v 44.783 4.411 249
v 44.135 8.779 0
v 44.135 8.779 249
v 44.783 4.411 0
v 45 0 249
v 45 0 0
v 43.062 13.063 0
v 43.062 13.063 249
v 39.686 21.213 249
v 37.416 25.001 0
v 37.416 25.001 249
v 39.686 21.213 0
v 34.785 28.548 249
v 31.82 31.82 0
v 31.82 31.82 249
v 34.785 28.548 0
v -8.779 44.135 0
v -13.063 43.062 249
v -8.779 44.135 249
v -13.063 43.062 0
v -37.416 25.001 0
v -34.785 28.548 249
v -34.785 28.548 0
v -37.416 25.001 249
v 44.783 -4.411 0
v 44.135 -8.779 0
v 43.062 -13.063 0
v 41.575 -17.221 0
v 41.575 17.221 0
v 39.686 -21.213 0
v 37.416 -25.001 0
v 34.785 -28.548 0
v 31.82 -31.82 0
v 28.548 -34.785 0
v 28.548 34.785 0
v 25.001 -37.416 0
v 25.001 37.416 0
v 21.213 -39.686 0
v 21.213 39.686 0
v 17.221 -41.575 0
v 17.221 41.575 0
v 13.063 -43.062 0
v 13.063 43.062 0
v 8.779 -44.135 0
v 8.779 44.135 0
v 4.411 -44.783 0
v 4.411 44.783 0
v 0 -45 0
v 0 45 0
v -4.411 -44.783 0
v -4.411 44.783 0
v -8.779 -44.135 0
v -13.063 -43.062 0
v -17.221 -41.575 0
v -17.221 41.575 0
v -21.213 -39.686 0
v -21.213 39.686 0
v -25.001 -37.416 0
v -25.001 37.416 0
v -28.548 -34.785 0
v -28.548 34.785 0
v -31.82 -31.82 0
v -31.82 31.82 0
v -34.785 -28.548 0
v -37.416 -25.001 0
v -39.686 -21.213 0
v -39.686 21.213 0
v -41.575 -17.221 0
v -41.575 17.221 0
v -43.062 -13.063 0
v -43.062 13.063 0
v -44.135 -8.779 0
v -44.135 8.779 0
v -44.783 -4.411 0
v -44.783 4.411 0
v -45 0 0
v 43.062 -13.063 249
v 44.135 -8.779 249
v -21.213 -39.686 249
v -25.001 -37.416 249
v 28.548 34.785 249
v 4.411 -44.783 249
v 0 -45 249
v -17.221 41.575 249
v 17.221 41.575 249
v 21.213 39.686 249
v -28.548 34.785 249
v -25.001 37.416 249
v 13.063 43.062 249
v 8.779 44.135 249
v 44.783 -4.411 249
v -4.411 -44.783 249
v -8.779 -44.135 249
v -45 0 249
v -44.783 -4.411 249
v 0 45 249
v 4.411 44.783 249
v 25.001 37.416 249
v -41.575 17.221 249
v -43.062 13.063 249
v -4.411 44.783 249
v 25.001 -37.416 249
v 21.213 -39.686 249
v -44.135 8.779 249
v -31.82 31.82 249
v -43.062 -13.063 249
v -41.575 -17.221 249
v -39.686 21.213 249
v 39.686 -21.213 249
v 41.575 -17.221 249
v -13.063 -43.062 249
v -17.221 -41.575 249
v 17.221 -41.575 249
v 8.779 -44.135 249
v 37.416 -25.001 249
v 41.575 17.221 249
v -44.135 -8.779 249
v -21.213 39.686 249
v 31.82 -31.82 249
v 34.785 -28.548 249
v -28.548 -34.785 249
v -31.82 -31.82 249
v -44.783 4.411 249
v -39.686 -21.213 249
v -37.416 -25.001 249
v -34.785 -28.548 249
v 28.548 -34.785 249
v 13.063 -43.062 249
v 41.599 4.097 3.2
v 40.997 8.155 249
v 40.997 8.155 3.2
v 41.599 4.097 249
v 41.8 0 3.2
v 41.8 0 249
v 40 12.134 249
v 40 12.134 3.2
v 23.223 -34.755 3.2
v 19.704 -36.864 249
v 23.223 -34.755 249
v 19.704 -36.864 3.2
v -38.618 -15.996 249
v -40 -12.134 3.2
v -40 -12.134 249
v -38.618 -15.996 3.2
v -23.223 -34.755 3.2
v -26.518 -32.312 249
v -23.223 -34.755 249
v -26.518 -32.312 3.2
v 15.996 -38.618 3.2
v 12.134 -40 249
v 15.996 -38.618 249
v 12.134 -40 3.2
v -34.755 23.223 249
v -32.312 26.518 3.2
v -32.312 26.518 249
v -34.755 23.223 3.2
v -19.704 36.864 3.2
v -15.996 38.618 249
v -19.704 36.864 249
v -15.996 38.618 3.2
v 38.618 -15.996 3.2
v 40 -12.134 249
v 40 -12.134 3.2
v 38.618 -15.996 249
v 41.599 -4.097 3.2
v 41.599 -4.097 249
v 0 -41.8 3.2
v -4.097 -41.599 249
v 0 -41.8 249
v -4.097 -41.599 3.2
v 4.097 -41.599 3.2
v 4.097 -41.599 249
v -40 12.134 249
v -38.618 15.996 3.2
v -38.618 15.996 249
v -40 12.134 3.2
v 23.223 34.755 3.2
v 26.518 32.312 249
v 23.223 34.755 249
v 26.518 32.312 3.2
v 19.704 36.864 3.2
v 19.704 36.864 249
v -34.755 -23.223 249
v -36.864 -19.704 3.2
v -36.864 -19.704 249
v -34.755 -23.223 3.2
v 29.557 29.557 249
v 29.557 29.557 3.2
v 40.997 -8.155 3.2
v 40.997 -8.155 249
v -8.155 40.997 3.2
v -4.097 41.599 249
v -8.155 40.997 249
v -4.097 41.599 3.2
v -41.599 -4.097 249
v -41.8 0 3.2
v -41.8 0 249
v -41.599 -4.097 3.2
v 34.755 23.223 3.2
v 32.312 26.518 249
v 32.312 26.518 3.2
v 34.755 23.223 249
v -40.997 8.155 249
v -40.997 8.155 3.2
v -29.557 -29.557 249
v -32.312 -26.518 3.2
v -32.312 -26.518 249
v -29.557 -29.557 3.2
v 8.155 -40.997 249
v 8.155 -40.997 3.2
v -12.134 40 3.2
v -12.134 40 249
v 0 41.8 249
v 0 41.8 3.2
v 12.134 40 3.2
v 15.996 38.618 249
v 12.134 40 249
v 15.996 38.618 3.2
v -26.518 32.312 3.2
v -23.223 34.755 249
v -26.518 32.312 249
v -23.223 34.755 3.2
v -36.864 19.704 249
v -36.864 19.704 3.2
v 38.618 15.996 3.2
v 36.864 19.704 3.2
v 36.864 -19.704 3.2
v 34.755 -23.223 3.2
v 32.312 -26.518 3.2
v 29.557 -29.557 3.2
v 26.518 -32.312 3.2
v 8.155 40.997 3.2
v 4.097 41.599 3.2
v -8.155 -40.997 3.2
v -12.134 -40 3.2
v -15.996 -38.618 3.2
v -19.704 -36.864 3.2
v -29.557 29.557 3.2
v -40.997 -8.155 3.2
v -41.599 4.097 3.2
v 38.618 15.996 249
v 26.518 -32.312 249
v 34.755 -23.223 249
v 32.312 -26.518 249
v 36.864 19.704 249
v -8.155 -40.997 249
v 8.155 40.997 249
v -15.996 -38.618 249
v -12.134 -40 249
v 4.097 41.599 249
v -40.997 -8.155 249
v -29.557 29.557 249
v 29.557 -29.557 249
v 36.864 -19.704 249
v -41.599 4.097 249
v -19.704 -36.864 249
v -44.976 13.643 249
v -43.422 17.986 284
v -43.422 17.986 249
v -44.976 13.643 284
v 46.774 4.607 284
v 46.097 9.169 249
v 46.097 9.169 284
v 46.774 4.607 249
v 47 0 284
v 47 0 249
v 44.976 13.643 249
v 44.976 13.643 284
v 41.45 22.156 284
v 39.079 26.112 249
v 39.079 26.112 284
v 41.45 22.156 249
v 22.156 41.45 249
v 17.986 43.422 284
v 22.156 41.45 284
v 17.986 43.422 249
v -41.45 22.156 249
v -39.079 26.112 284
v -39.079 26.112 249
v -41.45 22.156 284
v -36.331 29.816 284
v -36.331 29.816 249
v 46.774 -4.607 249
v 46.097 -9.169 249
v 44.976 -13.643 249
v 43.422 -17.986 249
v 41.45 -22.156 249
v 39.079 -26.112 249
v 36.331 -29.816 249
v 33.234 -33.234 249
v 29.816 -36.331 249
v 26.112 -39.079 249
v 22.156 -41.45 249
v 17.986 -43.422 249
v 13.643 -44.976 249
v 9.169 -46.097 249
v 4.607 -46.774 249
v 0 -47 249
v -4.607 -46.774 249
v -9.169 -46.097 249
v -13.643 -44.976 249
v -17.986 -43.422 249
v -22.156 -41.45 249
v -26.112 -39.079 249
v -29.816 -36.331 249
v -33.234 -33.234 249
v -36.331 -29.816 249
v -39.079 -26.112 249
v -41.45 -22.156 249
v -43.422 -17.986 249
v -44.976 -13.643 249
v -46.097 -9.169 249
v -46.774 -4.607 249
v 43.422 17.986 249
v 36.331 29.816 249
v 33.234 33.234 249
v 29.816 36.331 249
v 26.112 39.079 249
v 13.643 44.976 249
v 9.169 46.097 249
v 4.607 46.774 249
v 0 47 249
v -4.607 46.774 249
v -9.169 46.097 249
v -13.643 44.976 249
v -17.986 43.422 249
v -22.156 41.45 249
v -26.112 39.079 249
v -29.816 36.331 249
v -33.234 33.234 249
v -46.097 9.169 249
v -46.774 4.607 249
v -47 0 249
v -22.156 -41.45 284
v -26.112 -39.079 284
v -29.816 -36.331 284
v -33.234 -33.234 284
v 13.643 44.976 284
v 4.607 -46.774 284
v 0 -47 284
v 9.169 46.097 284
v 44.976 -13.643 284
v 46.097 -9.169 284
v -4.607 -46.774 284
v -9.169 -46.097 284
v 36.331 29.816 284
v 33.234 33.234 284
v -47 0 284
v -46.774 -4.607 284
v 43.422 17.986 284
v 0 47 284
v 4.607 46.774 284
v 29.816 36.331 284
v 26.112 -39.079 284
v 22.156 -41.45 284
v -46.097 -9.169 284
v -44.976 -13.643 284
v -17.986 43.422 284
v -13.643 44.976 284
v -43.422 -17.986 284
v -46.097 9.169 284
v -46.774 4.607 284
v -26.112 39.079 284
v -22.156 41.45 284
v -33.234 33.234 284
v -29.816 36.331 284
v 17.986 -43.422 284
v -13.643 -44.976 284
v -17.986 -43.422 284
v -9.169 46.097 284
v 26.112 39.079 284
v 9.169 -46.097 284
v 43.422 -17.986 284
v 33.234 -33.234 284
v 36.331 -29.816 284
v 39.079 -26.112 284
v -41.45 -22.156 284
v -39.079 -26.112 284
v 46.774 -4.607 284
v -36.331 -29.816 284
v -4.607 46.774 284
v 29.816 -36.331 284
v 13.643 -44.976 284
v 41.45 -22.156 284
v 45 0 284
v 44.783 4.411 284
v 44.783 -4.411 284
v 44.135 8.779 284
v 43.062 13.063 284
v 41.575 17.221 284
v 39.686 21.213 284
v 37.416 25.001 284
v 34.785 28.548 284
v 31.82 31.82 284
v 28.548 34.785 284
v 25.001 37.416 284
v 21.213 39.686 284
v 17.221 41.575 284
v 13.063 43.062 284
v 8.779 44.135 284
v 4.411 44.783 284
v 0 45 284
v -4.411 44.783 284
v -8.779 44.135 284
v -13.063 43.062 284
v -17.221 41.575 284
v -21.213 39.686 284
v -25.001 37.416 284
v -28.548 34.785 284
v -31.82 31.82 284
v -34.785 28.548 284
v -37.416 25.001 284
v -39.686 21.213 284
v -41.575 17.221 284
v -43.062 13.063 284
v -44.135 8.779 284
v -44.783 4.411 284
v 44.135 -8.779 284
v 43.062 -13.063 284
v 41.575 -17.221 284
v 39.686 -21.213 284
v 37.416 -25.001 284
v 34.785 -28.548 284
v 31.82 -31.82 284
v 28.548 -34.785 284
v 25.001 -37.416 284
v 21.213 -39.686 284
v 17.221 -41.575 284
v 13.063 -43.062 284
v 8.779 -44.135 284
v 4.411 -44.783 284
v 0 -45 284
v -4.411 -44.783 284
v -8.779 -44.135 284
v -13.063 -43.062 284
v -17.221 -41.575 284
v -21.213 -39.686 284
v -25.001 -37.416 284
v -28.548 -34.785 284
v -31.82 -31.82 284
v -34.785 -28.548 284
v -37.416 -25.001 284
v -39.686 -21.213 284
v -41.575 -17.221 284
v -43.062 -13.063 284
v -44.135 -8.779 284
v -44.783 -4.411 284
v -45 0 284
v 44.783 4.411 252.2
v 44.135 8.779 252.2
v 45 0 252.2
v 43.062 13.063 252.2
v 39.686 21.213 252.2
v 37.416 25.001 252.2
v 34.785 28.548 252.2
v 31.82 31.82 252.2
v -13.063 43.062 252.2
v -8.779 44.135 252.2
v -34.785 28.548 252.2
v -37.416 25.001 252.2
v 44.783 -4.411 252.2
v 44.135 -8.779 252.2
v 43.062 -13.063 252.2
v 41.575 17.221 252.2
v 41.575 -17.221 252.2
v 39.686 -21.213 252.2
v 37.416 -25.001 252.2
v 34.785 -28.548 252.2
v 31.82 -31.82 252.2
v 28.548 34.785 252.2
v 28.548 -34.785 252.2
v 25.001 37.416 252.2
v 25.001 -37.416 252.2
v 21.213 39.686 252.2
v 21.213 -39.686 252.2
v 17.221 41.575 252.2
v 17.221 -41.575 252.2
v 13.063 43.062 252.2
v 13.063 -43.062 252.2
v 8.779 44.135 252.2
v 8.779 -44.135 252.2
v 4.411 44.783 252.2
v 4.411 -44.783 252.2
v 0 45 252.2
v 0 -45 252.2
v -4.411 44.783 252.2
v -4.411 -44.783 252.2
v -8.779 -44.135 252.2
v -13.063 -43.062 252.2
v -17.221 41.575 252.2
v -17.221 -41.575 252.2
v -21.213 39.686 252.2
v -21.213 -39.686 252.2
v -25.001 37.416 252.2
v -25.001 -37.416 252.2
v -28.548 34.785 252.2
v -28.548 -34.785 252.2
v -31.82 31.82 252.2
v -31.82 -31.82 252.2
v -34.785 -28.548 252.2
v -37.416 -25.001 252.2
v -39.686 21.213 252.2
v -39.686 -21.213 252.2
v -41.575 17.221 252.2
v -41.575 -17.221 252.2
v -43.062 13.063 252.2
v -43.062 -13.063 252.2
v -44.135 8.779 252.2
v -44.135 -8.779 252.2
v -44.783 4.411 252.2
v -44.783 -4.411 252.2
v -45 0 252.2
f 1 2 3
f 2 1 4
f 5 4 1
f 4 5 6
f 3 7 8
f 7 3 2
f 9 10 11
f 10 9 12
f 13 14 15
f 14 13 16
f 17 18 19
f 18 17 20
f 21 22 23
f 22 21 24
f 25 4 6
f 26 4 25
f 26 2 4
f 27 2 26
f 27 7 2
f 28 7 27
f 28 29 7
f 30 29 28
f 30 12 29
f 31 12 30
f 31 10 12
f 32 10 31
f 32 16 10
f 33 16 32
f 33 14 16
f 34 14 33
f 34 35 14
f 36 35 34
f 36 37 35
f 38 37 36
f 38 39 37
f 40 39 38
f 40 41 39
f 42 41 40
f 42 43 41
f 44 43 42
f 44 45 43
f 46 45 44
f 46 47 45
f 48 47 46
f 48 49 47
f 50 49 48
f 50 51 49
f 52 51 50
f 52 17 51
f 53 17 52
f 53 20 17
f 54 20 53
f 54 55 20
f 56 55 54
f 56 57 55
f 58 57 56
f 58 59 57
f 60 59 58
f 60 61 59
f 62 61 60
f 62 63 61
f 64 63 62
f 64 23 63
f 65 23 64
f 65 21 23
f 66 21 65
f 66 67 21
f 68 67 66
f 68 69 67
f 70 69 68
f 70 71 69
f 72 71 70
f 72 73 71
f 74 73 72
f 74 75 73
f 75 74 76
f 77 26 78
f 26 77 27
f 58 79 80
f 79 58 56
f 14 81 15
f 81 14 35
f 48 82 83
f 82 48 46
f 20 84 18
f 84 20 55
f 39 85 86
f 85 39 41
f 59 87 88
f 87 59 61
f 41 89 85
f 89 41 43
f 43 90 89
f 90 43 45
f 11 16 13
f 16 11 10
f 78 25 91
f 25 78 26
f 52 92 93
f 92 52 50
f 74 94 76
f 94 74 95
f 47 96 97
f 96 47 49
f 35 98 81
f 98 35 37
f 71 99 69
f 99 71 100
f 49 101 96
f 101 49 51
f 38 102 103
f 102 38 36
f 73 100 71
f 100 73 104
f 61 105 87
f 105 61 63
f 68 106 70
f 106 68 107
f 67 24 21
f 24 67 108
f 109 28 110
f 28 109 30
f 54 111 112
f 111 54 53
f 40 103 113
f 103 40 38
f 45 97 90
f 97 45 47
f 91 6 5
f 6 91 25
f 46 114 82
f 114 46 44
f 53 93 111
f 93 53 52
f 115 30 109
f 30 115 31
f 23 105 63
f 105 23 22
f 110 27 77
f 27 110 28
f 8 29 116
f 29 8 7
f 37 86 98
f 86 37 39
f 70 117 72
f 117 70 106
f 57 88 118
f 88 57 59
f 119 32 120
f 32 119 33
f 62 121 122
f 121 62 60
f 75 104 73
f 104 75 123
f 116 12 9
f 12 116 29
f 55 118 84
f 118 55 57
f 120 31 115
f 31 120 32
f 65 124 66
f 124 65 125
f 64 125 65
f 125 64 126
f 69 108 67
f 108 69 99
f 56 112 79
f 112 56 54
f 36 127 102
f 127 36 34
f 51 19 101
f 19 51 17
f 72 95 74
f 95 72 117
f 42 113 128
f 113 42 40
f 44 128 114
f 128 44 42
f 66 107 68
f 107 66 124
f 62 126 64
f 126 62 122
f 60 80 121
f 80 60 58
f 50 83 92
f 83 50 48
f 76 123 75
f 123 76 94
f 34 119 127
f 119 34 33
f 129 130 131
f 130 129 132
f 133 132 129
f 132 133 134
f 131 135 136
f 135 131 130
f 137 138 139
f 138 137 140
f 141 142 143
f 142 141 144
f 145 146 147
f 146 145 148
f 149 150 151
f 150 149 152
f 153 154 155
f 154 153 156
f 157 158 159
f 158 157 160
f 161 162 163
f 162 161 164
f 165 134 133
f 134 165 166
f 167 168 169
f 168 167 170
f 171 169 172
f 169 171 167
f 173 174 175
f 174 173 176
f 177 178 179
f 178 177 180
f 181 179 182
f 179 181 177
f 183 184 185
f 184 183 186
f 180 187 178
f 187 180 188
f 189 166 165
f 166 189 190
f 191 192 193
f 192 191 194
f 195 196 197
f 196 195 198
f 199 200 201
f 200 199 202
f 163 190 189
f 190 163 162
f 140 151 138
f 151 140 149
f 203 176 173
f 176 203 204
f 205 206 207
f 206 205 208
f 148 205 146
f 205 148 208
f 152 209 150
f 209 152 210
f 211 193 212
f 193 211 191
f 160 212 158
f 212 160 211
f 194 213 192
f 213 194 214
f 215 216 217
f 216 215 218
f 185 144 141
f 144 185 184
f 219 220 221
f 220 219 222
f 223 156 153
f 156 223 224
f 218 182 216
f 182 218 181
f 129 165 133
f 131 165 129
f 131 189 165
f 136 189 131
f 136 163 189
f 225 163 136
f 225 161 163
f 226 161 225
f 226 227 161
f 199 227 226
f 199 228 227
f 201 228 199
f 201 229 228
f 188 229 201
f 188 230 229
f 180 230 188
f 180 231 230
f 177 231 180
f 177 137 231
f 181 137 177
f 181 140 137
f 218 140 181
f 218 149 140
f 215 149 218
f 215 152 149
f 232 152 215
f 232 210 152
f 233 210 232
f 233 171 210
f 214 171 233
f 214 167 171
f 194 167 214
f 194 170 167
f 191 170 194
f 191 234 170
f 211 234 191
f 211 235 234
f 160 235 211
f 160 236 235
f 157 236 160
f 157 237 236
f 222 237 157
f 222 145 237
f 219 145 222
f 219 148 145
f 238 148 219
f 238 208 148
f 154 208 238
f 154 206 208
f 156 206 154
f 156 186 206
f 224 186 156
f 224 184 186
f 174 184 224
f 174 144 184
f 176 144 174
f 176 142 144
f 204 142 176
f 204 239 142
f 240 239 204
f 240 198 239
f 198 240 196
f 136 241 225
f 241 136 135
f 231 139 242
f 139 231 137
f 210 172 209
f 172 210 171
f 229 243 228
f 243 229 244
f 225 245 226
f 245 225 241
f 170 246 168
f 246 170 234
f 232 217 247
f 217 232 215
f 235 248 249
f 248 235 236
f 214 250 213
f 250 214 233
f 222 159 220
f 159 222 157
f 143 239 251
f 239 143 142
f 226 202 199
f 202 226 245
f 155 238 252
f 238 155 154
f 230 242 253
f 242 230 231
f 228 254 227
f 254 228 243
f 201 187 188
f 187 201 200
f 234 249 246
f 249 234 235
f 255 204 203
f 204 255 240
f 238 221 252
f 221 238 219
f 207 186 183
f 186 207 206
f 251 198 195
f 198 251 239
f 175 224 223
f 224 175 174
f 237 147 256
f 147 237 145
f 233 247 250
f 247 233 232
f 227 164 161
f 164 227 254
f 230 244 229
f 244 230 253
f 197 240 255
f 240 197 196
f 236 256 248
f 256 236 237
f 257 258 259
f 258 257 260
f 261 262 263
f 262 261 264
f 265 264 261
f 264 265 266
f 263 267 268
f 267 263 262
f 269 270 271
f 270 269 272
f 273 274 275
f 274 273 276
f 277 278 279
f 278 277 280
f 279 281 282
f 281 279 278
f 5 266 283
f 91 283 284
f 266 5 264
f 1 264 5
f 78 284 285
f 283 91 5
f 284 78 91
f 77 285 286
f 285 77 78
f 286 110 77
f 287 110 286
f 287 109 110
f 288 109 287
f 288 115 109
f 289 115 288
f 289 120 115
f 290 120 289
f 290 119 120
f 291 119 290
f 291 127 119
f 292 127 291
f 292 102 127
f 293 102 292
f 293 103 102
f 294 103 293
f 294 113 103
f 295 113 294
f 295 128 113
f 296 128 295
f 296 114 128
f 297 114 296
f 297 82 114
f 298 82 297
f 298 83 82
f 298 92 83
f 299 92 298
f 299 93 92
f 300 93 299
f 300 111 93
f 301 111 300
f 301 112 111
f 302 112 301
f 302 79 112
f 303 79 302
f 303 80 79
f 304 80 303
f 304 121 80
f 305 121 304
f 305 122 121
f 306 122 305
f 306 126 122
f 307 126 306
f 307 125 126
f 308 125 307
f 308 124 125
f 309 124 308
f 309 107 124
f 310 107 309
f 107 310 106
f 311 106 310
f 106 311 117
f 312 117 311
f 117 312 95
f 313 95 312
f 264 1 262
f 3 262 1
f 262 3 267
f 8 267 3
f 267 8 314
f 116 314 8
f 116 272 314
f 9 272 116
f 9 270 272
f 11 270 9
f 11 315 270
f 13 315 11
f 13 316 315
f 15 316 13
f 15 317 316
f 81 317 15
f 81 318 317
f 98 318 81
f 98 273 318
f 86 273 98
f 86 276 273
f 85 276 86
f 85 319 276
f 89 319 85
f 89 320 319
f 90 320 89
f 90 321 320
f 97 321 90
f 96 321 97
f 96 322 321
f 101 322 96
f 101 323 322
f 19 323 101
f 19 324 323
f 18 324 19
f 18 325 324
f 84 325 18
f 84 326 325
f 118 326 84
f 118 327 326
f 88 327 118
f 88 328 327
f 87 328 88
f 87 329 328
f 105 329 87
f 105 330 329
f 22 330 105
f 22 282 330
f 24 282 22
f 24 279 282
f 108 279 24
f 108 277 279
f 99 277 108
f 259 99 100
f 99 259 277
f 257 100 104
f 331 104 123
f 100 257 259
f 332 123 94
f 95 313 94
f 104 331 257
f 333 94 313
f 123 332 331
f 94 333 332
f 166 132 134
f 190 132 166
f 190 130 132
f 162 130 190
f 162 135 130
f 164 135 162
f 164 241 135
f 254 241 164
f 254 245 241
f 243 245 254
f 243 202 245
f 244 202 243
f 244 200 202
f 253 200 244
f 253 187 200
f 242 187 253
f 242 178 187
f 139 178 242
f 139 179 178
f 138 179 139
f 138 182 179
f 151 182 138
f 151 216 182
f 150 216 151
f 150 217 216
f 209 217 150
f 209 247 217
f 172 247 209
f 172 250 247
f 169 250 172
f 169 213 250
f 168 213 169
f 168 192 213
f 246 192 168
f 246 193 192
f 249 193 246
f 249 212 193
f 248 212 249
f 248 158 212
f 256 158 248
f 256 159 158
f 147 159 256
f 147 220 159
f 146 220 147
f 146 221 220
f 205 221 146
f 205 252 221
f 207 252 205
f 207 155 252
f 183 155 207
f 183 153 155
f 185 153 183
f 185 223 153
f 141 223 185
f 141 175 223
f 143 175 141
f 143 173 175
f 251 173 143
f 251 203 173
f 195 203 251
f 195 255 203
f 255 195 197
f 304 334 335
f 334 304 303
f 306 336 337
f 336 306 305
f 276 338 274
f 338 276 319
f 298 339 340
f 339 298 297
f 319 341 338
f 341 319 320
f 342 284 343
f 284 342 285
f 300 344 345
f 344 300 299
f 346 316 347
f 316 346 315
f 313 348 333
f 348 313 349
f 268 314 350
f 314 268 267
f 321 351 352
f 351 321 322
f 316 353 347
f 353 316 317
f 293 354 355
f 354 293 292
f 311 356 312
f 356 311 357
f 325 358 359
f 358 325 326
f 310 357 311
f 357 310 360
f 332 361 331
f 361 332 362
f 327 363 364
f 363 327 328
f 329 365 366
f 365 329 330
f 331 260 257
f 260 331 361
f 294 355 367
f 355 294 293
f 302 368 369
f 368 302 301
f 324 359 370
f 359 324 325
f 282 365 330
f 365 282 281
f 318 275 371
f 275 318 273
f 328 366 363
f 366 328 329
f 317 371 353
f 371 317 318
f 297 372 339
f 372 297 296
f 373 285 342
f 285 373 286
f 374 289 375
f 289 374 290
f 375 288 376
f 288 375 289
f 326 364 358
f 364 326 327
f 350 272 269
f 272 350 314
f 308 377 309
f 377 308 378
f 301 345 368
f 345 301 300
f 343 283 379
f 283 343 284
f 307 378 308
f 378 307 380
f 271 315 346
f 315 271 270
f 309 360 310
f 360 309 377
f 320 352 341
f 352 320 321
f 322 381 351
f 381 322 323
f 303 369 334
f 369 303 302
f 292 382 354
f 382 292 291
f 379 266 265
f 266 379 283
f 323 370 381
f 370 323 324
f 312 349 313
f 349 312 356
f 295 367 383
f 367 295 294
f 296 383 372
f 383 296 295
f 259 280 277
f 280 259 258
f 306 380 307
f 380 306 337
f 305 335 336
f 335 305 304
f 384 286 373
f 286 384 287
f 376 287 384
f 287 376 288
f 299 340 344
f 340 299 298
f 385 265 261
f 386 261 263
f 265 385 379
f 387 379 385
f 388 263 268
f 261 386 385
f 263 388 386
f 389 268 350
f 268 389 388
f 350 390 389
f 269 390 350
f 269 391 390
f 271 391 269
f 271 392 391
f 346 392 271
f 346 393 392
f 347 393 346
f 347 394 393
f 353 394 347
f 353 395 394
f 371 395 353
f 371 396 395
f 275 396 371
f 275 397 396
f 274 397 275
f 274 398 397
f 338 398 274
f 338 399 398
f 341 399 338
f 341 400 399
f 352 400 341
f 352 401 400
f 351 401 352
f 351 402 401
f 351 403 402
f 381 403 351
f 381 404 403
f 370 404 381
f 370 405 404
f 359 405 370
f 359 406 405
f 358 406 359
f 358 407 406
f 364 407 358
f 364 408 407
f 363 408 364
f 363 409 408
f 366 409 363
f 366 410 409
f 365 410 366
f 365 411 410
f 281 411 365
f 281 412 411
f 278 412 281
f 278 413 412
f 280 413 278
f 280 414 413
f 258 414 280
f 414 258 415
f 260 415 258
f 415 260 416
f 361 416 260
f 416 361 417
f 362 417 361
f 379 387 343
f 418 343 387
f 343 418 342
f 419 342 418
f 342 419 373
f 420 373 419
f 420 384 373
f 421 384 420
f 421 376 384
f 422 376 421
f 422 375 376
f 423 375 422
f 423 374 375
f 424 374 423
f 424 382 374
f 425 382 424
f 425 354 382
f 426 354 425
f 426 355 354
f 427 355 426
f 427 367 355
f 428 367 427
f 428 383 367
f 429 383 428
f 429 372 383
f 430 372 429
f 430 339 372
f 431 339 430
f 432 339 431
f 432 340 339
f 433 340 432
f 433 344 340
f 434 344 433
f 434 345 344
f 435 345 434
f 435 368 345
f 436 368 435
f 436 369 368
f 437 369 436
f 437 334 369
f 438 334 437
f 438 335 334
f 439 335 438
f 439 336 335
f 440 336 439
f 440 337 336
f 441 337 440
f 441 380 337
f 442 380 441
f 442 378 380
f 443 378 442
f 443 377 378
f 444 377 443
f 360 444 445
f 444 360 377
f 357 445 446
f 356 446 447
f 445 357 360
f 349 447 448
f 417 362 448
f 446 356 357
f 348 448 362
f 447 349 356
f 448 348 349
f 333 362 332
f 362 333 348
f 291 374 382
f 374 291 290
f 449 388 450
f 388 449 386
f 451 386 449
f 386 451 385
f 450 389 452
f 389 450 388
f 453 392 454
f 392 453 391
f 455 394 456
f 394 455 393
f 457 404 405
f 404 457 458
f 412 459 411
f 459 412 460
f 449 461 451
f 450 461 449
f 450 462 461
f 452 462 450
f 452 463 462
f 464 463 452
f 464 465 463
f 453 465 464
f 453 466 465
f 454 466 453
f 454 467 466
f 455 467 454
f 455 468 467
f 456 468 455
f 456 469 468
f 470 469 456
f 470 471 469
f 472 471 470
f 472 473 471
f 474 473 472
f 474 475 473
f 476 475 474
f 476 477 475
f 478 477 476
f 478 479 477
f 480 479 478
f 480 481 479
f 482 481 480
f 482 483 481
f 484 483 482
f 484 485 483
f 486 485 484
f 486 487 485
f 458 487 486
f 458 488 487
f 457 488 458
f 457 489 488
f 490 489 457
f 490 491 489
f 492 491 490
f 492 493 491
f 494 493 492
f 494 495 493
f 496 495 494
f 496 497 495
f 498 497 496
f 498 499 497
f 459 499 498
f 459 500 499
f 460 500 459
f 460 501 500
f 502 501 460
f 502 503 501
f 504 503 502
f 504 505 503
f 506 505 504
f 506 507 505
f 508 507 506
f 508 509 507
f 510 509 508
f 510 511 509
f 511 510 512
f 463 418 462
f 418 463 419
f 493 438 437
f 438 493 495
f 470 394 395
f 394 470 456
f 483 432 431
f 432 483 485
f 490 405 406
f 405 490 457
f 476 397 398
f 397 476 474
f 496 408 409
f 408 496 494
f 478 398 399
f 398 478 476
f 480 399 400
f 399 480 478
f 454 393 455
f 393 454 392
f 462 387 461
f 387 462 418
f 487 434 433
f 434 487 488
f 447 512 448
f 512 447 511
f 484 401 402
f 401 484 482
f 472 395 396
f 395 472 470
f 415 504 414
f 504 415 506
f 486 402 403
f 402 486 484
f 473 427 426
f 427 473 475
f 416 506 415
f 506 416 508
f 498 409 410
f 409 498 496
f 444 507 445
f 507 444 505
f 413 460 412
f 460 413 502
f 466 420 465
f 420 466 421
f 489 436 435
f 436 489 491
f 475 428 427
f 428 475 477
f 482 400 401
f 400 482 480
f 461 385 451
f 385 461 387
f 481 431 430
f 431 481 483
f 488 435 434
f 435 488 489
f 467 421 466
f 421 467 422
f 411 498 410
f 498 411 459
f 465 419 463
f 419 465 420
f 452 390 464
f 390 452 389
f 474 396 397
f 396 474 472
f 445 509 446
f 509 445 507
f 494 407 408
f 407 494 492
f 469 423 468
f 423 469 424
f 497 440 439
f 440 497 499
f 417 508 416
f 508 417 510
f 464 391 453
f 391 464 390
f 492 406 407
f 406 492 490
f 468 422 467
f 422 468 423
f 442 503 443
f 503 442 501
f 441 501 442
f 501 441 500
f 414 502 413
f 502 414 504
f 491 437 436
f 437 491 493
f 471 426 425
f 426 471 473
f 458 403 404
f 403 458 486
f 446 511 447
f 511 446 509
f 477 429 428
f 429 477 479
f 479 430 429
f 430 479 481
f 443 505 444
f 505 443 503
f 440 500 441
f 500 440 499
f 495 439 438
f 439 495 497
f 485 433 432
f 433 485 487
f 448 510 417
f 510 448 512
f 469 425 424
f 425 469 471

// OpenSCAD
// Parameters
pipe_standard = 1; //[1:1:1]
nominal_size = 90; //[45:180:1]
length_mm = 250; //[125:500:1]
orientation = 0; //[0:0:1]
center = 0; //[0:1:1]
pipe_od = 90; //[45:180:1]
pipe_wall = 3.2; //[1.6:6.4:0.1]
socket_length = 35; //[18:70:1]
socket_wall_extra = 2.0; //[1.0:4.0:0.1]
overlap = 1.0; //[0.5:2.0:0.1]

// HT Pipe - complete geometry
module ht_pipe() {
  color([0.85, 0.85, 0.8]) { // PVC color
    union() {
      // Pipe body
      difference() {
        translate([0, 0, 0])
          cylinder(h=length_mm, r=pipe_od/2, center=false, $fn=64);
        translate([0, 0, pipe_wall])
          cylinder(h=length_mm, r=pipe_od/2 - pipe_wall, center=false, $fn=64);
      }
      // End fitting socket
      difference() {
        translate([0, 0, length_mm - overlap])
          cylinder(h=socket_length, r=pipe_od/2 + socket_wall_extra, center=false, $fn=64);
        translate([0, 0, length_mm - overlap + pipe_wall])
          cylinder(h=socket_length, r=pipe_od/2, center=false, $fn=64);
      }
    }
  }
}

// Assembly
module assembly() {
  ht_pipe();
}

assembly();
